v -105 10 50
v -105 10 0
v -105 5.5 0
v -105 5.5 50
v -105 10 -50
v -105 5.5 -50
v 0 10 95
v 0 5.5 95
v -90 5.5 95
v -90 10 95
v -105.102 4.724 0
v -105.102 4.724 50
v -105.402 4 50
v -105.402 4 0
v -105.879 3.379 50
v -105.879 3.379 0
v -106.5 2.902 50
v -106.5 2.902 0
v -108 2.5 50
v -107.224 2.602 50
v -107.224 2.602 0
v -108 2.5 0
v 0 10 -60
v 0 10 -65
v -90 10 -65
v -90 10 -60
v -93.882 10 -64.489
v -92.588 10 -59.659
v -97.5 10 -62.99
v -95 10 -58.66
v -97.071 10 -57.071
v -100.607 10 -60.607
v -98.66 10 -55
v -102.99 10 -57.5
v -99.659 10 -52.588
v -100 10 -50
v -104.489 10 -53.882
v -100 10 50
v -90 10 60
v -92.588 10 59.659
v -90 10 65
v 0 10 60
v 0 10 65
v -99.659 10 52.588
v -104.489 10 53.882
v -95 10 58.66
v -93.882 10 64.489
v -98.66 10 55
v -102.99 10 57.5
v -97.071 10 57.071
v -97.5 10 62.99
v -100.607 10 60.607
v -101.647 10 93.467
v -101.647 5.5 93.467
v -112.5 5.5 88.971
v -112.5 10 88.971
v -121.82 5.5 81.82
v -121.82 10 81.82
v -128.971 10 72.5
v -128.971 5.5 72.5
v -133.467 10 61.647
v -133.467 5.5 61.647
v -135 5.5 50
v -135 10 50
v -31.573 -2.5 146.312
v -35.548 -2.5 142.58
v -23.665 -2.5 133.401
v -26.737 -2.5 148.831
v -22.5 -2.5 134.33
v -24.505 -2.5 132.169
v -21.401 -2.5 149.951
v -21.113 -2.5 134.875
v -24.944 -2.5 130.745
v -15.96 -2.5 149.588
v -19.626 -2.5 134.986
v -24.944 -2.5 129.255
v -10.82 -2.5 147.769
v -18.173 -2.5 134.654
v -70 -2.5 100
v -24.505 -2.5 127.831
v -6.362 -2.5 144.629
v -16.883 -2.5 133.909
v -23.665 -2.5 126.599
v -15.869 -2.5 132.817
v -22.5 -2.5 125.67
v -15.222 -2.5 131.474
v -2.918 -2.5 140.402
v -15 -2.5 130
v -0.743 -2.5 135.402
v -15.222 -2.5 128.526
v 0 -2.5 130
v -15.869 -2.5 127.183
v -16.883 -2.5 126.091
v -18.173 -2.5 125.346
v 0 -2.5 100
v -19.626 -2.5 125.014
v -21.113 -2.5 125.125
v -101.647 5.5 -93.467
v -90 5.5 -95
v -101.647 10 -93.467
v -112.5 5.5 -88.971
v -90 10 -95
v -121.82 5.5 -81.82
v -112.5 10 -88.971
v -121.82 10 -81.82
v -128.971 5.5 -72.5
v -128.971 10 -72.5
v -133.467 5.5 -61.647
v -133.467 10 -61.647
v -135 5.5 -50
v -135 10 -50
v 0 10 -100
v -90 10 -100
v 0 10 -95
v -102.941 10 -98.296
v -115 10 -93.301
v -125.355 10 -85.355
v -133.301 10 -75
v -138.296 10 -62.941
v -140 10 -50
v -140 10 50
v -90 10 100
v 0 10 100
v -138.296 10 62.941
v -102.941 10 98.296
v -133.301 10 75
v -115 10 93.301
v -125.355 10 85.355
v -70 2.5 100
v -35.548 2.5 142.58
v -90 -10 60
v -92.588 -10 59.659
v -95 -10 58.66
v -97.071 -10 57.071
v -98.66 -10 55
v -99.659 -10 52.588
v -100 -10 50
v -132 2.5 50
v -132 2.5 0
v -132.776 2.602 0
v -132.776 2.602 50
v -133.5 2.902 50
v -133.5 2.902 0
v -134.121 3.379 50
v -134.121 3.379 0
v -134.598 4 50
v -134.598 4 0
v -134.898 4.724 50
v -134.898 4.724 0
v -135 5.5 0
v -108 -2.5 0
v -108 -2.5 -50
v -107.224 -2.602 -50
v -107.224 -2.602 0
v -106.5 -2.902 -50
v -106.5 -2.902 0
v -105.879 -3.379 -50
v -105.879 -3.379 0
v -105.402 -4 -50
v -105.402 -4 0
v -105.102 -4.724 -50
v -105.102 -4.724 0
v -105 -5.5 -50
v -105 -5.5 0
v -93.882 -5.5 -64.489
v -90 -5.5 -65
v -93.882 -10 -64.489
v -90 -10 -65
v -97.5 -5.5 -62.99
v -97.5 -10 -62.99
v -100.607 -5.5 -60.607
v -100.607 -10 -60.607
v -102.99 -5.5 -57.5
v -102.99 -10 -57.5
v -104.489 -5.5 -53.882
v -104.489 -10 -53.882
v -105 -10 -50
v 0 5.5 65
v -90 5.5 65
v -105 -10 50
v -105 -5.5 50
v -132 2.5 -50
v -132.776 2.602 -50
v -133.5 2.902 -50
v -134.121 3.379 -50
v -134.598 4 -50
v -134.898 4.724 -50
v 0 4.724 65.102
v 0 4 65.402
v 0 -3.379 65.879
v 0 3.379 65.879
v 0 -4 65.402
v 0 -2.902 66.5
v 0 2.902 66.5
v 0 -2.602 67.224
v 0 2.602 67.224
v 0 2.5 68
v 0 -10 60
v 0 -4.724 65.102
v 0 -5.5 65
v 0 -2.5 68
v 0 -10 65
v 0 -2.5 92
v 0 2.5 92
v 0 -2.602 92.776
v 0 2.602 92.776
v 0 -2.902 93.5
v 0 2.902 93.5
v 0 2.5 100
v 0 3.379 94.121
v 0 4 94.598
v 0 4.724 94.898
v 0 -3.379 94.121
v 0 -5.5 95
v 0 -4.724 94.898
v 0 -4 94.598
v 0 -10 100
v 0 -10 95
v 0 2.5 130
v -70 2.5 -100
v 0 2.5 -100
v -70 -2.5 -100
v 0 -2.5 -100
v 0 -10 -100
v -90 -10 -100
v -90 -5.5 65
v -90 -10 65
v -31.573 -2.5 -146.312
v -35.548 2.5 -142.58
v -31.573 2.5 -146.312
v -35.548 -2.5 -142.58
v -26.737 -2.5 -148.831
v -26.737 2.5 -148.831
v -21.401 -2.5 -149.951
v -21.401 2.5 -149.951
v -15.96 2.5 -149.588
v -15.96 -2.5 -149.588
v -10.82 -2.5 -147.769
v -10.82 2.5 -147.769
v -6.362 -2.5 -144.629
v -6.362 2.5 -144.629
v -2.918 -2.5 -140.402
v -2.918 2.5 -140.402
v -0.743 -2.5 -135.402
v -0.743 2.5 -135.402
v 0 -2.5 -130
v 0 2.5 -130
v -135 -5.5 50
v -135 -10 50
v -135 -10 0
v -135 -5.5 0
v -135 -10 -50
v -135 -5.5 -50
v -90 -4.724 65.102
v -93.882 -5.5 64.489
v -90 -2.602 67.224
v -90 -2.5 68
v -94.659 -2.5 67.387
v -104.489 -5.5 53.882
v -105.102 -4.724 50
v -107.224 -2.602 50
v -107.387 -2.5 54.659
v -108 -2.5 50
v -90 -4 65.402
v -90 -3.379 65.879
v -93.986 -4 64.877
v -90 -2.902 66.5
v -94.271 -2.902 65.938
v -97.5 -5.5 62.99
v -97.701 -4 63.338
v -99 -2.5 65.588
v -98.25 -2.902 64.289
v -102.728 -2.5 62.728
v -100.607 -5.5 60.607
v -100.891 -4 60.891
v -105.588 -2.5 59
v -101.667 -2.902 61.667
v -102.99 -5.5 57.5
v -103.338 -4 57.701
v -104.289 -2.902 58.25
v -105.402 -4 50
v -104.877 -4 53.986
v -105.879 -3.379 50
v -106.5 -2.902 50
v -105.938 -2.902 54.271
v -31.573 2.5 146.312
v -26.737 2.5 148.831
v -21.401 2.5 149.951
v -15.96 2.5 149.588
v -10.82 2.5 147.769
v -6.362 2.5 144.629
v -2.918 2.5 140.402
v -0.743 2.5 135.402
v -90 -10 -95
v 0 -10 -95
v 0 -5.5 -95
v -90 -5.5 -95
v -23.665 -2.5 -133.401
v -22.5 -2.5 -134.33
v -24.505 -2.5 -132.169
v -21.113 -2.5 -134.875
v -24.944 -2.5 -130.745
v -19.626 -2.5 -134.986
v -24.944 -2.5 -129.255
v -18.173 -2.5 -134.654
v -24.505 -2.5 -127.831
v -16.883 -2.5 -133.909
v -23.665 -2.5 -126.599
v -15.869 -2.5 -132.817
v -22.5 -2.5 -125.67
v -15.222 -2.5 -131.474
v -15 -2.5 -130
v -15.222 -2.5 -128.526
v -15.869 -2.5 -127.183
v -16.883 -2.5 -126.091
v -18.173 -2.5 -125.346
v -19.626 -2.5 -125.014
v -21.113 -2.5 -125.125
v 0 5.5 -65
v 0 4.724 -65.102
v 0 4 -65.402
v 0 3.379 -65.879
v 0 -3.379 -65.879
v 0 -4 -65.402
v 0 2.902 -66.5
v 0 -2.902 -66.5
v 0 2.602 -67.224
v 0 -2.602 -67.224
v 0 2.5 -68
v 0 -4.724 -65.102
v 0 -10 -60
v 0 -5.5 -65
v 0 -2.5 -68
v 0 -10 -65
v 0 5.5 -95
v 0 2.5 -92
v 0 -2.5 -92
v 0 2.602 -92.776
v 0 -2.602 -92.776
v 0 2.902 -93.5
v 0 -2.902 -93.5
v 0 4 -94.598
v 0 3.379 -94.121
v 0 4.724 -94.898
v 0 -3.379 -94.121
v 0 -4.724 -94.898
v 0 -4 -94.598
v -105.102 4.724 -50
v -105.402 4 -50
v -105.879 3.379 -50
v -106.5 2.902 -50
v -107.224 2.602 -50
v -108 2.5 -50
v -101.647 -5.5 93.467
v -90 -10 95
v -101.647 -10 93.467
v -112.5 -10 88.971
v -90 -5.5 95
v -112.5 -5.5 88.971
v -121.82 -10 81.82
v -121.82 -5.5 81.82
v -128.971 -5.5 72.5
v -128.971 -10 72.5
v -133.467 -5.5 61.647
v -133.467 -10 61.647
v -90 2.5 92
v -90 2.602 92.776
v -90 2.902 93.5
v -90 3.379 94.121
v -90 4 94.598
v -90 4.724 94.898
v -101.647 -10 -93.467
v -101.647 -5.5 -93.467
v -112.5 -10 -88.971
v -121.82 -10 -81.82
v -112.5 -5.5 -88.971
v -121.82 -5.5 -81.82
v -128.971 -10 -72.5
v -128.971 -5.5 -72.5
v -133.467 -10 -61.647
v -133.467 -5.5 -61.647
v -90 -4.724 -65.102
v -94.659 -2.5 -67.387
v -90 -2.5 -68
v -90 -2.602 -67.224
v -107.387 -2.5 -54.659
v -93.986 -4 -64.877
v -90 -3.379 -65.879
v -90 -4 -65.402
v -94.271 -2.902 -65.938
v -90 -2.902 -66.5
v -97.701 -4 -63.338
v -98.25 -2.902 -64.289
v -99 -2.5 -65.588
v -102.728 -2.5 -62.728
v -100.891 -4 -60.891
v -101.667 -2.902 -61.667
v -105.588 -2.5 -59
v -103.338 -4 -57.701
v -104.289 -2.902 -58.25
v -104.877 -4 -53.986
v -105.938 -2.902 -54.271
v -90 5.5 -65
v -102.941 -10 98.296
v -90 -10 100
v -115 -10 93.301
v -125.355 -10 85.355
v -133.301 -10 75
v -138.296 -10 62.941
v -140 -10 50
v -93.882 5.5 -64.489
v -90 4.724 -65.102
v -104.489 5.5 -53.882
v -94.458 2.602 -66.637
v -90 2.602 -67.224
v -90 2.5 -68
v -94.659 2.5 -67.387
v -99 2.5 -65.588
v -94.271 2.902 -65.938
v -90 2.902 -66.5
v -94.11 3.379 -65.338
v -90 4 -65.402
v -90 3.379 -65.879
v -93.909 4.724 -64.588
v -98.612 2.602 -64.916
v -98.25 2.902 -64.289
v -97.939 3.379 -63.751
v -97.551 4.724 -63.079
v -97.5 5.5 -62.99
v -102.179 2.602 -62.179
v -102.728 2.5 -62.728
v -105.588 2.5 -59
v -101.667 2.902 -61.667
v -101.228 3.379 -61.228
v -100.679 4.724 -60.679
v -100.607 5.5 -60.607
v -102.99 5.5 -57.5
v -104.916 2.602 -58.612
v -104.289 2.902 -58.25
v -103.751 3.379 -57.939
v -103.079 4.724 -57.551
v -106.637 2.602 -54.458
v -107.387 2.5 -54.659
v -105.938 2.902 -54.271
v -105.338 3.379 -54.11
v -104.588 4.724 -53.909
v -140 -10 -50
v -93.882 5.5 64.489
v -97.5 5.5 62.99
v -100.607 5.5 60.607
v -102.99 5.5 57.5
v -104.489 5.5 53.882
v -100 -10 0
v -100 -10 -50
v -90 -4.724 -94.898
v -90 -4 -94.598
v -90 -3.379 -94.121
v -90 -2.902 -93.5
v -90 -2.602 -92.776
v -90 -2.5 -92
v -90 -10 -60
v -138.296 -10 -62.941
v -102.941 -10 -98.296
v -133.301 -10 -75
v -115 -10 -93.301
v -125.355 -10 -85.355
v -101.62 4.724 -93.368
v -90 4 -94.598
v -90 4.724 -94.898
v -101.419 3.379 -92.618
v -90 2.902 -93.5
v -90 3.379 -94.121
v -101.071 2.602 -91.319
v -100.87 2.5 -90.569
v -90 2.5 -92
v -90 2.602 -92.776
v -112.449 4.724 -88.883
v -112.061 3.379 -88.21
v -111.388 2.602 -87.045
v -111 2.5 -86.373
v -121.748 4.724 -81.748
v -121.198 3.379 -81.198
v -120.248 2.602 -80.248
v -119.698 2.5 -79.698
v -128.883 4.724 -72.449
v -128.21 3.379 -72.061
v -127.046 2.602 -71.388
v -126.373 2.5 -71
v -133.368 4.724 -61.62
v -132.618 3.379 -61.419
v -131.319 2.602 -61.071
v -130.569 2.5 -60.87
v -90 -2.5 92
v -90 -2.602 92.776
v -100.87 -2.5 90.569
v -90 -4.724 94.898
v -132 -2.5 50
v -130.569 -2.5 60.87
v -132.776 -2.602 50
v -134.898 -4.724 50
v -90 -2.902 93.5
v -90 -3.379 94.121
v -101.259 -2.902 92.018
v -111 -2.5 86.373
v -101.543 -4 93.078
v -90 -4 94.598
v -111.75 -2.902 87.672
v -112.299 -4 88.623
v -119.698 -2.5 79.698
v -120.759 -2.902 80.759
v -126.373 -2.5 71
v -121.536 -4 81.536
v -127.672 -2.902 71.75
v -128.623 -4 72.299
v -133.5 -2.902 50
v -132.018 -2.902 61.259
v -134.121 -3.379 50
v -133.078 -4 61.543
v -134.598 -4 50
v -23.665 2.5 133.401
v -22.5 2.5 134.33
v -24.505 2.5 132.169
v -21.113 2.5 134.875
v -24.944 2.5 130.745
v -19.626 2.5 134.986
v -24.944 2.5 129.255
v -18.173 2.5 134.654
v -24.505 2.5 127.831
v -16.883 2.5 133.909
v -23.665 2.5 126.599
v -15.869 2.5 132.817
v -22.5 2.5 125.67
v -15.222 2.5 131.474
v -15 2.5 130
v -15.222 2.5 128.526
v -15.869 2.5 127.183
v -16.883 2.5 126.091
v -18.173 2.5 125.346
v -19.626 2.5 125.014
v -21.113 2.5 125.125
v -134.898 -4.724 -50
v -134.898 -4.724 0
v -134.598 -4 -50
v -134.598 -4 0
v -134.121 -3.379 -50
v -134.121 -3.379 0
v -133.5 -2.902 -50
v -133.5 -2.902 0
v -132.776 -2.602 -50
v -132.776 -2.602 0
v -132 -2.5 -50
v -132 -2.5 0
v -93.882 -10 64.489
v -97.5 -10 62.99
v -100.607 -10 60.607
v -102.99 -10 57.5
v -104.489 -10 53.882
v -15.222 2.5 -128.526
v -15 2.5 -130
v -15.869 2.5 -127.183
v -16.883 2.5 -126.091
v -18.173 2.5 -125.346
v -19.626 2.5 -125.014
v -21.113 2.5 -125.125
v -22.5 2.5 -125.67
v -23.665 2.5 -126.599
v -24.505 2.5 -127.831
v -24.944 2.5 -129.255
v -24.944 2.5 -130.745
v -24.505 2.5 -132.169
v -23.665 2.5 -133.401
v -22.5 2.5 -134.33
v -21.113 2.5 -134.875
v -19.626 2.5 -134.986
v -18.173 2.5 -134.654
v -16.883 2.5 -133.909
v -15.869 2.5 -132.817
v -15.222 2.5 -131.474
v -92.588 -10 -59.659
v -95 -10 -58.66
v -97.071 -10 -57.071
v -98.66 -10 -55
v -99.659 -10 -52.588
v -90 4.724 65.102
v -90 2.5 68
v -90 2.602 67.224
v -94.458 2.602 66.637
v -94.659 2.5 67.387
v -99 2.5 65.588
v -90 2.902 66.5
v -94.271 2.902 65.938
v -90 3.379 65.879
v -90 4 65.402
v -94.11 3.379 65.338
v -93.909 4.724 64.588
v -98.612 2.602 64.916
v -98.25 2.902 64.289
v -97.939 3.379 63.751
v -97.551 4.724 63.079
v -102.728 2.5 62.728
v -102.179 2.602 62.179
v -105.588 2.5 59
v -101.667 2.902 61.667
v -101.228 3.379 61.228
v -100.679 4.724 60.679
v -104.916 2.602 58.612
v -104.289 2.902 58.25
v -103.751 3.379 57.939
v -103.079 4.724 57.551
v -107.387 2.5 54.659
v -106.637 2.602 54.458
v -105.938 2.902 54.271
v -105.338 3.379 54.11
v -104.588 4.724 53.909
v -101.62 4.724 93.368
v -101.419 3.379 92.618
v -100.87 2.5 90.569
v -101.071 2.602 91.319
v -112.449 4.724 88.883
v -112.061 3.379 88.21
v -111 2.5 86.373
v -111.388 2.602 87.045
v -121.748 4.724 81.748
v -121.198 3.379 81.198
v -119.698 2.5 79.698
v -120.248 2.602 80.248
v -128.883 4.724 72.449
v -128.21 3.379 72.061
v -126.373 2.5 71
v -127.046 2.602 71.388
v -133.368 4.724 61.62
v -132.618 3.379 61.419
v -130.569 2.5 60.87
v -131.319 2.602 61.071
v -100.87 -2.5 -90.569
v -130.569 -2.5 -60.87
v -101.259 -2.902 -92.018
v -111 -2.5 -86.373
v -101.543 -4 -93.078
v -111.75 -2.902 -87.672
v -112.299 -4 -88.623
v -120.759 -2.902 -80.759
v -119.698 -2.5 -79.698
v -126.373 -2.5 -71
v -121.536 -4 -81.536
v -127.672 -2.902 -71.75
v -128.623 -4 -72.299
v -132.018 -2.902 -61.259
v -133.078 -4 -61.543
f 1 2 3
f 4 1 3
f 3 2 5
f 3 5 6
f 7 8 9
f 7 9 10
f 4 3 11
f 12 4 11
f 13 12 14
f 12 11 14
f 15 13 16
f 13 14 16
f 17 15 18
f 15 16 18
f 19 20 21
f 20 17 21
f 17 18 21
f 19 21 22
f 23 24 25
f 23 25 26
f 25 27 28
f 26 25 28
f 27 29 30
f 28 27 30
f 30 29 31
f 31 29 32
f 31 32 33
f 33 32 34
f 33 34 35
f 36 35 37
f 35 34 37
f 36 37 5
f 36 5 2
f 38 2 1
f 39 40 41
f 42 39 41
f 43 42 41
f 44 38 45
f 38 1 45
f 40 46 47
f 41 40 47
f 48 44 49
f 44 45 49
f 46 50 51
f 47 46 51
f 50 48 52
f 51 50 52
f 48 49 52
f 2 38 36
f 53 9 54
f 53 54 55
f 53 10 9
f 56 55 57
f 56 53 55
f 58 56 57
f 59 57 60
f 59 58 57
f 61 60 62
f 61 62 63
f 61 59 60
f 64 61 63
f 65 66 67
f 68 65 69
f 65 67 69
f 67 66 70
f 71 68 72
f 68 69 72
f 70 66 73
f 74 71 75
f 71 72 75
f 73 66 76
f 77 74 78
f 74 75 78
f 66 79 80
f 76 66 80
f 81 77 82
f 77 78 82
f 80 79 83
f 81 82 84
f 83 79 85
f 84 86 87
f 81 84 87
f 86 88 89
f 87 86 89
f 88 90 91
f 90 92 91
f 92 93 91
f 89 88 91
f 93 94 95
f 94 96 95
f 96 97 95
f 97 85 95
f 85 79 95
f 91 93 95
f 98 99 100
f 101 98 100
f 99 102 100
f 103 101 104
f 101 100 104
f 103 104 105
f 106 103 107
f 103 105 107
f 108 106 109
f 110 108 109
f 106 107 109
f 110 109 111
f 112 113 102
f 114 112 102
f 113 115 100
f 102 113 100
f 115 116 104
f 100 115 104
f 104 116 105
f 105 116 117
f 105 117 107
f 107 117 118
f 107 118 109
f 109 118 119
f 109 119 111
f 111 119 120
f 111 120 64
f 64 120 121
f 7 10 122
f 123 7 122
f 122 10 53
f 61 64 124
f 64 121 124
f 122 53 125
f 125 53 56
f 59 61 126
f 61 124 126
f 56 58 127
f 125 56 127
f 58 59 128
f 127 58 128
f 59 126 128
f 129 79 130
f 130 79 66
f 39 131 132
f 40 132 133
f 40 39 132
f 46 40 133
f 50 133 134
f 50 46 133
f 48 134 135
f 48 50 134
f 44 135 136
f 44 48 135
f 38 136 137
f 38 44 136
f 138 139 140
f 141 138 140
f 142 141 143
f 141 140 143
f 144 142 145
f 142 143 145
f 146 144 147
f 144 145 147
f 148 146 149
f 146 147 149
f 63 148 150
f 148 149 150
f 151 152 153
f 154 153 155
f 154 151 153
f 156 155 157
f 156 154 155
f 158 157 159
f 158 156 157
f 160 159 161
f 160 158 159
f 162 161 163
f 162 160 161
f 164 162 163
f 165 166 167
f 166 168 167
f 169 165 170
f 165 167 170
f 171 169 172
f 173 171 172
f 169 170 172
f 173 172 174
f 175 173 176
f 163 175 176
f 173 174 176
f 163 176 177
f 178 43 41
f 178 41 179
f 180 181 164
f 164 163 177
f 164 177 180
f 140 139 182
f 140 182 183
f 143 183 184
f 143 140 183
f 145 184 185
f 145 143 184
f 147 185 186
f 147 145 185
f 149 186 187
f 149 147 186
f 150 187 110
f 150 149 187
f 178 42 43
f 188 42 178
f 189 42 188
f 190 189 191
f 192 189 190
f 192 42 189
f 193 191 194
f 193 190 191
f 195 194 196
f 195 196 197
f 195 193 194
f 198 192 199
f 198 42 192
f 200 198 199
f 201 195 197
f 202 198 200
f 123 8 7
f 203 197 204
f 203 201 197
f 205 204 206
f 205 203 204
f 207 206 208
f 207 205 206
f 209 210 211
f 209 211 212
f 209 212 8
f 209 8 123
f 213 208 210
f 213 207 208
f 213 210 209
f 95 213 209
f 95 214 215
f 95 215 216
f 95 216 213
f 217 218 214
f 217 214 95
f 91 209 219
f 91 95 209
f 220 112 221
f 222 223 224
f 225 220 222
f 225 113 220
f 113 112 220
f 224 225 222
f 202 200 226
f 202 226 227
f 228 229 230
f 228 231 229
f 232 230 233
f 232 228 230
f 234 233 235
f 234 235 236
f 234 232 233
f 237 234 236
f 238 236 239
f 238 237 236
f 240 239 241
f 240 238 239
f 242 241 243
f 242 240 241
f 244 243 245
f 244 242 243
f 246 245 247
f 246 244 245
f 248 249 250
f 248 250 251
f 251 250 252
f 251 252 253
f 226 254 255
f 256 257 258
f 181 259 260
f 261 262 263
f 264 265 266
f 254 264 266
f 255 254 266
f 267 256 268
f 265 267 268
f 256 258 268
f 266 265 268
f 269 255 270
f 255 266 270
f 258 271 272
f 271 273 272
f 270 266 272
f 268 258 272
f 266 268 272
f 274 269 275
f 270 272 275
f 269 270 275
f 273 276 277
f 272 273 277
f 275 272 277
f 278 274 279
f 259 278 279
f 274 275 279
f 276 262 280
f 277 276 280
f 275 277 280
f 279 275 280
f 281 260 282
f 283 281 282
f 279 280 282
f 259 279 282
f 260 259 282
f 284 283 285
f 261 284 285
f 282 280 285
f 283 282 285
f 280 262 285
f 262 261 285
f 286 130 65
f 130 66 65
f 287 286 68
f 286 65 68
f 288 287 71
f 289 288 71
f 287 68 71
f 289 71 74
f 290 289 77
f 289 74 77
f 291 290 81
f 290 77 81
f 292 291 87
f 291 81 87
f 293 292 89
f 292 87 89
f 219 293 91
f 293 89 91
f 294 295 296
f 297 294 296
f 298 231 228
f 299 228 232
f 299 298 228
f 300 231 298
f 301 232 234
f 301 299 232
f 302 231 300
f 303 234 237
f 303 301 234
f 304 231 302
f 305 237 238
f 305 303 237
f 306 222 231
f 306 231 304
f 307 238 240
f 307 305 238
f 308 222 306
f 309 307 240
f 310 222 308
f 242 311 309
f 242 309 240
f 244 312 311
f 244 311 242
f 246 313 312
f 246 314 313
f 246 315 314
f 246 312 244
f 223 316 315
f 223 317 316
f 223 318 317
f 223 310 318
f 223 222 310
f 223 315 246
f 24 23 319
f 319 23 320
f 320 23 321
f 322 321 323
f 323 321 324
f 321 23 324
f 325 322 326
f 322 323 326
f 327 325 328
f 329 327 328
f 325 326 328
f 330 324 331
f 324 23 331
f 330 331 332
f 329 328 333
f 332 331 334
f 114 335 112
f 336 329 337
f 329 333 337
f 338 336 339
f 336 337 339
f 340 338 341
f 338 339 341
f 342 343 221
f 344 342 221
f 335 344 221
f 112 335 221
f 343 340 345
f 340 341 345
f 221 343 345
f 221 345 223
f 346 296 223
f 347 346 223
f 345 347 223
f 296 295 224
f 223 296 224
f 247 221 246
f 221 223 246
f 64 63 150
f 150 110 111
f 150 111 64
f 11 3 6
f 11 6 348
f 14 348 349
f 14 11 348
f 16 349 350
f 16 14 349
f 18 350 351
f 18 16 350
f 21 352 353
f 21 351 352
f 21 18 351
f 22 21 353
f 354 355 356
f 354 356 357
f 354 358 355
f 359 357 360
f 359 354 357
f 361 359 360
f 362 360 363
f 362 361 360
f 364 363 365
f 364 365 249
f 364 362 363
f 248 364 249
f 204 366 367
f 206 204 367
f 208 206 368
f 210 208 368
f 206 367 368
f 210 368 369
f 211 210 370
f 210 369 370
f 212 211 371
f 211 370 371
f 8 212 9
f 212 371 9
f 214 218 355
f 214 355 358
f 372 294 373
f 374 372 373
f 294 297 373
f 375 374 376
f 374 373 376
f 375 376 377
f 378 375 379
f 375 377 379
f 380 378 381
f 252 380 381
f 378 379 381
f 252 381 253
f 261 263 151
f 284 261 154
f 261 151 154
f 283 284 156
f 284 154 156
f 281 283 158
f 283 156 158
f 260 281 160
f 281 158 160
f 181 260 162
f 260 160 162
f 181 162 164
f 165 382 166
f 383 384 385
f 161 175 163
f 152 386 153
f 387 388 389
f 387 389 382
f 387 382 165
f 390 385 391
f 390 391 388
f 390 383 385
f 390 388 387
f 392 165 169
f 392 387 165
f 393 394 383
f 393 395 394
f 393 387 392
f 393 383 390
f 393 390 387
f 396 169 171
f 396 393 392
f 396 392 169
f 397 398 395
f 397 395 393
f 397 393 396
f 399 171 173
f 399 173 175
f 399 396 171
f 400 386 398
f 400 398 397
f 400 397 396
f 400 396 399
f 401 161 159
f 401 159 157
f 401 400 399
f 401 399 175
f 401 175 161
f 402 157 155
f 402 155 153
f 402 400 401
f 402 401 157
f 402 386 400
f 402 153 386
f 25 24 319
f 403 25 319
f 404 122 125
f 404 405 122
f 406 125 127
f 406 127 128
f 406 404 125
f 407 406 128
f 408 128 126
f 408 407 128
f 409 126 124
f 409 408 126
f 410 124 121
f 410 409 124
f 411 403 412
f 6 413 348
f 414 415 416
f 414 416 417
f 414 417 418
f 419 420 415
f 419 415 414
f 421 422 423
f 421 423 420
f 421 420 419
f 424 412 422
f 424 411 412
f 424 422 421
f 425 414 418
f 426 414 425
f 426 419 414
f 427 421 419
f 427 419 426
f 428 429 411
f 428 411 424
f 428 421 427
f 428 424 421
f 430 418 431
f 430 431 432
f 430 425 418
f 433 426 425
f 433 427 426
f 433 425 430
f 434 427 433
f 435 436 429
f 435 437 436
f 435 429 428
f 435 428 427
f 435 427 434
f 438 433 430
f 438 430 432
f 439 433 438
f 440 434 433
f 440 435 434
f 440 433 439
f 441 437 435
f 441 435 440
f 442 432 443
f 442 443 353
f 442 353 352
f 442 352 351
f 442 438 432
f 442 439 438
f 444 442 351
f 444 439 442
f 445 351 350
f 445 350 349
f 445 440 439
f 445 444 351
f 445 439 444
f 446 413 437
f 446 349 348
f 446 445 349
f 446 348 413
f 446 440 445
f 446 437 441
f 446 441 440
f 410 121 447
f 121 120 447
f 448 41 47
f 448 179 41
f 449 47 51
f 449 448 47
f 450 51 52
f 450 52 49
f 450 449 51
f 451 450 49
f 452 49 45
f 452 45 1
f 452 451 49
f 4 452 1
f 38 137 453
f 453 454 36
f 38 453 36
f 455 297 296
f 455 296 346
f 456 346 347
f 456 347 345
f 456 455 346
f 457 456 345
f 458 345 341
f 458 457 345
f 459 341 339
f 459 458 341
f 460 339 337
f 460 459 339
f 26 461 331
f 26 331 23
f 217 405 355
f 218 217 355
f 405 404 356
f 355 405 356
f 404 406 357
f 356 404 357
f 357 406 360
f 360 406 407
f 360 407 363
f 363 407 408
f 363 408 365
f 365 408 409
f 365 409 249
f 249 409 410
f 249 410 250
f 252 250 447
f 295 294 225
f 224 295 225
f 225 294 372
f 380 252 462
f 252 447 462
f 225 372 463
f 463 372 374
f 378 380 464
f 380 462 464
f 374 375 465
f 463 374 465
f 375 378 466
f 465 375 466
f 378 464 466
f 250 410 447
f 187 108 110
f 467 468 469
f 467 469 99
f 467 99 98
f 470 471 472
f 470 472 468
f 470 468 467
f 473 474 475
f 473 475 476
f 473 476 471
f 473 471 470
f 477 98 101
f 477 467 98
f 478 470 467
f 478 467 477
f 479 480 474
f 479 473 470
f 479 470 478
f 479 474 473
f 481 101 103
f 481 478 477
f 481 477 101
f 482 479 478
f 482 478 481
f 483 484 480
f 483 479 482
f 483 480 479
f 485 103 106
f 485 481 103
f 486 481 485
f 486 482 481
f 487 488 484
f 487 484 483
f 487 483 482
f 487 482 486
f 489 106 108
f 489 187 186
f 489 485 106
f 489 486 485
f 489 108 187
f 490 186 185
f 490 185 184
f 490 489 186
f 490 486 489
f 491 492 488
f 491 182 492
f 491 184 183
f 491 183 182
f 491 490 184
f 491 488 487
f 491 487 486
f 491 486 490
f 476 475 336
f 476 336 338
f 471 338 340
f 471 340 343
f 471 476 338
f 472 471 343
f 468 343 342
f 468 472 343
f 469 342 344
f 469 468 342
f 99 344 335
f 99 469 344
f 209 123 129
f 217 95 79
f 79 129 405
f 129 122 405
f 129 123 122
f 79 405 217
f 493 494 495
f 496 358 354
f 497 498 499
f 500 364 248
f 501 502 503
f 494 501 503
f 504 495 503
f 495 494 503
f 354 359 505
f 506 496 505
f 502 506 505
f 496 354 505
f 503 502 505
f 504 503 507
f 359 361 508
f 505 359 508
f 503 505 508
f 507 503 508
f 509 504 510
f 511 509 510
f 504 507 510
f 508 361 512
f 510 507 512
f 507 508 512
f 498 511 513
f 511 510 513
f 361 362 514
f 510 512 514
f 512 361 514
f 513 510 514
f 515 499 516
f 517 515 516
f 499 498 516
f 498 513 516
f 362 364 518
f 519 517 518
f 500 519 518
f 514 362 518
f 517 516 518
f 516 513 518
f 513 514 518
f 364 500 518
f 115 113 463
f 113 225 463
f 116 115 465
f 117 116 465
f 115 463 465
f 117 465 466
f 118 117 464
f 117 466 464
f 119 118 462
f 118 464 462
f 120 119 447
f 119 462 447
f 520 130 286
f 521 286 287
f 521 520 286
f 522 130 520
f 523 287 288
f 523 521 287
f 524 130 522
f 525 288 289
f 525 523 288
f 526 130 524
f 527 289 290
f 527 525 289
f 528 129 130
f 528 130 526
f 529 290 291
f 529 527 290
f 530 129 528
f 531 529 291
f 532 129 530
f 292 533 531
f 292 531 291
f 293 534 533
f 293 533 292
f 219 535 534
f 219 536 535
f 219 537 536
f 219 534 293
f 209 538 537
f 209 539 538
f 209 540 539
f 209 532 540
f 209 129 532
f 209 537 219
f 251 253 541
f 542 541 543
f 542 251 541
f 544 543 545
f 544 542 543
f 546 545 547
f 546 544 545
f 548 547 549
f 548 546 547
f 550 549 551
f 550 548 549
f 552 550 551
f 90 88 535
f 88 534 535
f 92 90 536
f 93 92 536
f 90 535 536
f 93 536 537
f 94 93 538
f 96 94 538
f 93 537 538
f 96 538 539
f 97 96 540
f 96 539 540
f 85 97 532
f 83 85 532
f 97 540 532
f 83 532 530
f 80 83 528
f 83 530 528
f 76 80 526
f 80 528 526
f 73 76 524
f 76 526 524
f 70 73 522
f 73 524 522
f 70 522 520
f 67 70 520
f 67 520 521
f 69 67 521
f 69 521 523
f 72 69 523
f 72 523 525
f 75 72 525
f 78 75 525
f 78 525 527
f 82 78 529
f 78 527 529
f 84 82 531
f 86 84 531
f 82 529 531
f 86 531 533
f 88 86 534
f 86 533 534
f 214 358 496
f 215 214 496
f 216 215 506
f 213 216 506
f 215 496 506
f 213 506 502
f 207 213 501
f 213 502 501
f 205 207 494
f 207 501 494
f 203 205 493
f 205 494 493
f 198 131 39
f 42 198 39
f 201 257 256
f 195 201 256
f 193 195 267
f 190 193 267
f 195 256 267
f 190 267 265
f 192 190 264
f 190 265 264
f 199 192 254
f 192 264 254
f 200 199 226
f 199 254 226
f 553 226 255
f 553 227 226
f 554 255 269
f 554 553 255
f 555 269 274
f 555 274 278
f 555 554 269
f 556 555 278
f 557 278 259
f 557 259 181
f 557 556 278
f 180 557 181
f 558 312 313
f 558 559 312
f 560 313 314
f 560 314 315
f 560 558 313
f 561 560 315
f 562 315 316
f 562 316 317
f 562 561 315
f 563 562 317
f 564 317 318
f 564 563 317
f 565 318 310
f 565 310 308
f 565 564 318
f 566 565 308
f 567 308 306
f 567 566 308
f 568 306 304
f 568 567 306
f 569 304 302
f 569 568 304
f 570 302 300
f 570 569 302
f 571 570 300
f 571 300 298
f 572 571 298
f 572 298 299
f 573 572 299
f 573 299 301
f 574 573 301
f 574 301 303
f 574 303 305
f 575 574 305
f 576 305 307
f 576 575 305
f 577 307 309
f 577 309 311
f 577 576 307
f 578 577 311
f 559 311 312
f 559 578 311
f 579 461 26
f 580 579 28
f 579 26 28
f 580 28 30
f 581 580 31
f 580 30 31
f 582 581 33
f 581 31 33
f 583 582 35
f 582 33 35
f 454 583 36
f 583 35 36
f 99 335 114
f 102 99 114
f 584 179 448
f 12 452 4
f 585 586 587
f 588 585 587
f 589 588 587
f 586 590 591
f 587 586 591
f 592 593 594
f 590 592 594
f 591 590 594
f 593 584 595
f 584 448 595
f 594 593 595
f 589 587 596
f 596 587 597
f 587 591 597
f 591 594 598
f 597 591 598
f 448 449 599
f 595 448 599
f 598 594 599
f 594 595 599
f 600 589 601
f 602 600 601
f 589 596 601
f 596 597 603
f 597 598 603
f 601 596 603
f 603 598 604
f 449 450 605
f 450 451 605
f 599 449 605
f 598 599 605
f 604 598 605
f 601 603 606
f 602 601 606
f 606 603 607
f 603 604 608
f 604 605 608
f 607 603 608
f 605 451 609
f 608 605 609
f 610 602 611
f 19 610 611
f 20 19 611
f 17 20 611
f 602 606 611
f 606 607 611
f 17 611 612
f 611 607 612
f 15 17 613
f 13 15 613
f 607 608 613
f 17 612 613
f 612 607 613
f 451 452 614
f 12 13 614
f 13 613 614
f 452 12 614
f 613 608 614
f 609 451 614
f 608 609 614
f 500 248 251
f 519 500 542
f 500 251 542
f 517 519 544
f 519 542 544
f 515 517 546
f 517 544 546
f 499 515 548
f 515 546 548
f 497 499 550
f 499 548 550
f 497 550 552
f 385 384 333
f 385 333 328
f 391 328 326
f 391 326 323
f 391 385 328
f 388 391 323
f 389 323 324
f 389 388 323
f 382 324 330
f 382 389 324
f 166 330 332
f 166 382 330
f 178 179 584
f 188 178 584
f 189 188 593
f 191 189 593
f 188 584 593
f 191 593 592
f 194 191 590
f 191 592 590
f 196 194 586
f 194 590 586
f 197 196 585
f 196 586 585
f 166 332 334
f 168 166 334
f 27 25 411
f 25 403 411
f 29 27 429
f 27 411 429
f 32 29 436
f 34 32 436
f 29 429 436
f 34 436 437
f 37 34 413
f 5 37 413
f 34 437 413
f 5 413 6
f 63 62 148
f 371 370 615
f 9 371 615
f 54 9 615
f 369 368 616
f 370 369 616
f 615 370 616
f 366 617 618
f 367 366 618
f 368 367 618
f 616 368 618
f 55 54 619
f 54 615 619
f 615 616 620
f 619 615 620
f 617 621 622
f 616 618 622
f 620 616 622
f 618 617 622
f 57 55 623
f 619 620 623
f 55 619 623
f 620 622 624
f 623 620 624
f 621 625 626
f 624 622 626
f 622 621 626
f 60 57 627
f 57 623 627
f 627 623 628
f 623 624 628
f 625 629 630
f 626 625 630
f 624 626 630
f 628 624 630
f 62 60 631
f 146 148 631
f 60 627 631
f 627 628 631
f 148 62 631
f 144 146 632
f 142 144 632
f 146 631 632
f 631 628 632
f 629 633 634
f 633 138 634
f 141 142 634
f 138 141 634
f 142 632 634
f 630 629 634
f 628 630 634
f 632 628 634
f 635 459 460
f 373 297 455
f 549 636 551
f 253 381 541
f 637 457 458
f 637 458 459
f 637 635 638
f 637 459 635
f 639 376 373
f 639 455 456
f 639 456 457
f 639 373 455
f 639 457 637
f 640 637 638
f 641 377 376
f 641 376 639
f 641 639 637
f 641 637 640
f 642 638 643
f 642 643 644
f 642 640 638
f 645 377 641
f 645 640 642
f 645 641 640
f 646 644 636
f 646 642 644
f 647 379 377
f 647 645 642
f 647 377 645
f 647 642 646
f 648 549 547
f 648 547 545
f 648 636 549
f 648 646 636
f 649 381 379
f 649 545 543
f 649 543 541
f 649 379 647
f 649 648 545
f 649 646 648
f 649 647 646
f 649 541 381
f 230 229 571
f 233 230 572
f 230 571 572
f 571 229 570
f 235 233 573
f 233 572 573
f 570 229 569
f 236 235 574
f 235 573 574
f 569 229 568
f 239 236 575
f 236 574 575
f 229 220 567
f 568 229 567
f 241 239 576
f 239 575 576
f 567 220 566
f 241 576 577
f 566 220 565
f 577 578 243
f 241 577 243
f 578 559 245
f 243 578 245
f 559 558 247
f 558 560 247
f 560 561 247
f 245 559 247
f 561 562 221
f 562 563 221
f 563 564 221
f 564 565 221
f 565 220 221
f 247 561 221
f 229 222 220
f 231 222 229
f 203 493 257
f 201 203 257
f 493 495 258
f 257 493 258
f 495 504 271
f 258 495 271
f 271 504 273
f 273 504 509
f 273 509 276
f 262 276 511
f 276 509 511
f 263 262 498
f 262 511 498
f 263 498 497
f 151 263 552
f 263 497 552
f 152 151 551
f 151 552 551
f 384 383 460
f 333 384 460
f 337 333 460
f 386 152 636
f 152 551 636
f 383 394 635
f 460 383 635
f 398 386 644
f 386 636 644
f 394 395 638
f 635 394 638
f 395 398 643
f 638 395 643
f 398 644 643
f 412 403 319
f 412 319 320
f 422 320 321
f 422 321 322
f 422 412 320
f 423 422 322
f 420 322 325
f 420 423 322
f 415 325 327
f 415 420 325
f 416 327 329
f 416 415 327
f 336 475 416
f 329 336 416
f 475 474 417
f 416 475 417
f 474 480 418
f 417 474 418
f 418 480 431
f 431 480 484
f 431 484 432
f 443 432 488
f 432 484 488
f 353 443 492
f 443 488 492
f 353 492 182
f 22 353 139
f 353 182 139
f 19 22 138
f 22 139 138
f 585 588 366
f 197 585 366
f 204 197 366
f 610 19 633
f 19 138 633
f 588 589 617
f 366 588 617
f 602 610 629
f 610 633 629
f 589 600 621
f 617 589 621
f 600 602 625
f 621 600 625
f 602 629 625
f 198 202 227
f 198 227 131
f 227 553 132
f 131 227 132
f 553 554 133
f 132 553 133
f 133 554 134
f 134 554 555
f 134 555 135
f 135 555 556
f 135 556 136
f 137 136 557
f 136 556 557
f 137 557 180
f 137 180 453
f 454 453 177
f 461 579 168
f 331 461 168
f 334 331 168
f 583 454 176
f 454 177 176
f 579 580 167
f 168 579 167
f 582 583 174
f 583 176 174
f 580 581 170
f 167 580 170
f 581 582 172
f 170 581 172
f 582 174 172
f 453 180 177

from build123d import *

# Parameters (mm, degrees)
F4_R     = 5
F5_DEPTH = 2.5


with BuildPart() as f2:
    # F2: sweep along a path in F0
    with BuildLine(Plane.XZ) as f2_path:
        Line((0, 60), (-90, 60))
        ThreePointArc((-90, 60), (-97.071068, 57.071068), (-100, 50))
        Line((-100, 50), (-100, 0))
    # F1 (on Right) → F2 (sweep)
    with BuildSketch(Plane.YZ):
        with BuildLine():
            Line((10, 100), (0, 100))
            Line((0, 100), (-10, 100))
            Line((-10, 100), (-10, 95))
            Line((-10, 95), (-5.5, 95))
            ThreePointArc((-5.5, 95), (-3.37868, 94.12132), (-2.5, 92))
            Line((-2.5, 92), (-2.5, 68))
            ThreePointArc((-2.5, 68), (-3.37868, 65.87868), (-5.5, 65))
            Line((-5.5, 65), (-10, 65))
            Line((-10, 65), (-10, 60))
            Line((-10, 60), (0, 60))
            Line((0, 60), (10, 60))
            Line((10, 60), (10, 65))
            Line((10, 65), (5.5, 65))
            ThreePointArc((5.5, 65), (3.37868, 65.87868), (2.5, 68))
            Line((2.5, 68), (2.5, 92))
            ThreePointArc((2.5, 92), (3.37868, 94.12132), (5.5, 95))
            Line((5.5, 95), (10, 95))
            Line((10, 95), (10, 100))
        make_face()
    sweep(path=f2_path.line)

    # F3: F2 across plane


with BuildPart() as f2_1:
    add(f2.part)
    add(f2.part.mirror(Plane.XY))

    # F4 (on Front) → F5 (join, symmetric)
    with BuildSketch(Plane.XZ):
        with BuildLine():
            Line((0, -130), (0, -100))
            Line((0, -100), (-70, -100))
            Line((-70, -100), (-35.548045, -142.580075))
            ThreePointArc((-35.548045, -142.580075), (-13.327703, -148.854189), (0, -130))
        make_face()
        with Locations((-20, -130)):
            Circle(F4_R, mode=Mode.SUBTRACT)
    extrude(amount=F5_DEPTH, both=True)

    # F6: F2 across plane


with BuildPart() as f2_2:
    add(f2_1.part)
    add(f2_1.part.mirror(Plane.XY))


solid = f2_2.part
